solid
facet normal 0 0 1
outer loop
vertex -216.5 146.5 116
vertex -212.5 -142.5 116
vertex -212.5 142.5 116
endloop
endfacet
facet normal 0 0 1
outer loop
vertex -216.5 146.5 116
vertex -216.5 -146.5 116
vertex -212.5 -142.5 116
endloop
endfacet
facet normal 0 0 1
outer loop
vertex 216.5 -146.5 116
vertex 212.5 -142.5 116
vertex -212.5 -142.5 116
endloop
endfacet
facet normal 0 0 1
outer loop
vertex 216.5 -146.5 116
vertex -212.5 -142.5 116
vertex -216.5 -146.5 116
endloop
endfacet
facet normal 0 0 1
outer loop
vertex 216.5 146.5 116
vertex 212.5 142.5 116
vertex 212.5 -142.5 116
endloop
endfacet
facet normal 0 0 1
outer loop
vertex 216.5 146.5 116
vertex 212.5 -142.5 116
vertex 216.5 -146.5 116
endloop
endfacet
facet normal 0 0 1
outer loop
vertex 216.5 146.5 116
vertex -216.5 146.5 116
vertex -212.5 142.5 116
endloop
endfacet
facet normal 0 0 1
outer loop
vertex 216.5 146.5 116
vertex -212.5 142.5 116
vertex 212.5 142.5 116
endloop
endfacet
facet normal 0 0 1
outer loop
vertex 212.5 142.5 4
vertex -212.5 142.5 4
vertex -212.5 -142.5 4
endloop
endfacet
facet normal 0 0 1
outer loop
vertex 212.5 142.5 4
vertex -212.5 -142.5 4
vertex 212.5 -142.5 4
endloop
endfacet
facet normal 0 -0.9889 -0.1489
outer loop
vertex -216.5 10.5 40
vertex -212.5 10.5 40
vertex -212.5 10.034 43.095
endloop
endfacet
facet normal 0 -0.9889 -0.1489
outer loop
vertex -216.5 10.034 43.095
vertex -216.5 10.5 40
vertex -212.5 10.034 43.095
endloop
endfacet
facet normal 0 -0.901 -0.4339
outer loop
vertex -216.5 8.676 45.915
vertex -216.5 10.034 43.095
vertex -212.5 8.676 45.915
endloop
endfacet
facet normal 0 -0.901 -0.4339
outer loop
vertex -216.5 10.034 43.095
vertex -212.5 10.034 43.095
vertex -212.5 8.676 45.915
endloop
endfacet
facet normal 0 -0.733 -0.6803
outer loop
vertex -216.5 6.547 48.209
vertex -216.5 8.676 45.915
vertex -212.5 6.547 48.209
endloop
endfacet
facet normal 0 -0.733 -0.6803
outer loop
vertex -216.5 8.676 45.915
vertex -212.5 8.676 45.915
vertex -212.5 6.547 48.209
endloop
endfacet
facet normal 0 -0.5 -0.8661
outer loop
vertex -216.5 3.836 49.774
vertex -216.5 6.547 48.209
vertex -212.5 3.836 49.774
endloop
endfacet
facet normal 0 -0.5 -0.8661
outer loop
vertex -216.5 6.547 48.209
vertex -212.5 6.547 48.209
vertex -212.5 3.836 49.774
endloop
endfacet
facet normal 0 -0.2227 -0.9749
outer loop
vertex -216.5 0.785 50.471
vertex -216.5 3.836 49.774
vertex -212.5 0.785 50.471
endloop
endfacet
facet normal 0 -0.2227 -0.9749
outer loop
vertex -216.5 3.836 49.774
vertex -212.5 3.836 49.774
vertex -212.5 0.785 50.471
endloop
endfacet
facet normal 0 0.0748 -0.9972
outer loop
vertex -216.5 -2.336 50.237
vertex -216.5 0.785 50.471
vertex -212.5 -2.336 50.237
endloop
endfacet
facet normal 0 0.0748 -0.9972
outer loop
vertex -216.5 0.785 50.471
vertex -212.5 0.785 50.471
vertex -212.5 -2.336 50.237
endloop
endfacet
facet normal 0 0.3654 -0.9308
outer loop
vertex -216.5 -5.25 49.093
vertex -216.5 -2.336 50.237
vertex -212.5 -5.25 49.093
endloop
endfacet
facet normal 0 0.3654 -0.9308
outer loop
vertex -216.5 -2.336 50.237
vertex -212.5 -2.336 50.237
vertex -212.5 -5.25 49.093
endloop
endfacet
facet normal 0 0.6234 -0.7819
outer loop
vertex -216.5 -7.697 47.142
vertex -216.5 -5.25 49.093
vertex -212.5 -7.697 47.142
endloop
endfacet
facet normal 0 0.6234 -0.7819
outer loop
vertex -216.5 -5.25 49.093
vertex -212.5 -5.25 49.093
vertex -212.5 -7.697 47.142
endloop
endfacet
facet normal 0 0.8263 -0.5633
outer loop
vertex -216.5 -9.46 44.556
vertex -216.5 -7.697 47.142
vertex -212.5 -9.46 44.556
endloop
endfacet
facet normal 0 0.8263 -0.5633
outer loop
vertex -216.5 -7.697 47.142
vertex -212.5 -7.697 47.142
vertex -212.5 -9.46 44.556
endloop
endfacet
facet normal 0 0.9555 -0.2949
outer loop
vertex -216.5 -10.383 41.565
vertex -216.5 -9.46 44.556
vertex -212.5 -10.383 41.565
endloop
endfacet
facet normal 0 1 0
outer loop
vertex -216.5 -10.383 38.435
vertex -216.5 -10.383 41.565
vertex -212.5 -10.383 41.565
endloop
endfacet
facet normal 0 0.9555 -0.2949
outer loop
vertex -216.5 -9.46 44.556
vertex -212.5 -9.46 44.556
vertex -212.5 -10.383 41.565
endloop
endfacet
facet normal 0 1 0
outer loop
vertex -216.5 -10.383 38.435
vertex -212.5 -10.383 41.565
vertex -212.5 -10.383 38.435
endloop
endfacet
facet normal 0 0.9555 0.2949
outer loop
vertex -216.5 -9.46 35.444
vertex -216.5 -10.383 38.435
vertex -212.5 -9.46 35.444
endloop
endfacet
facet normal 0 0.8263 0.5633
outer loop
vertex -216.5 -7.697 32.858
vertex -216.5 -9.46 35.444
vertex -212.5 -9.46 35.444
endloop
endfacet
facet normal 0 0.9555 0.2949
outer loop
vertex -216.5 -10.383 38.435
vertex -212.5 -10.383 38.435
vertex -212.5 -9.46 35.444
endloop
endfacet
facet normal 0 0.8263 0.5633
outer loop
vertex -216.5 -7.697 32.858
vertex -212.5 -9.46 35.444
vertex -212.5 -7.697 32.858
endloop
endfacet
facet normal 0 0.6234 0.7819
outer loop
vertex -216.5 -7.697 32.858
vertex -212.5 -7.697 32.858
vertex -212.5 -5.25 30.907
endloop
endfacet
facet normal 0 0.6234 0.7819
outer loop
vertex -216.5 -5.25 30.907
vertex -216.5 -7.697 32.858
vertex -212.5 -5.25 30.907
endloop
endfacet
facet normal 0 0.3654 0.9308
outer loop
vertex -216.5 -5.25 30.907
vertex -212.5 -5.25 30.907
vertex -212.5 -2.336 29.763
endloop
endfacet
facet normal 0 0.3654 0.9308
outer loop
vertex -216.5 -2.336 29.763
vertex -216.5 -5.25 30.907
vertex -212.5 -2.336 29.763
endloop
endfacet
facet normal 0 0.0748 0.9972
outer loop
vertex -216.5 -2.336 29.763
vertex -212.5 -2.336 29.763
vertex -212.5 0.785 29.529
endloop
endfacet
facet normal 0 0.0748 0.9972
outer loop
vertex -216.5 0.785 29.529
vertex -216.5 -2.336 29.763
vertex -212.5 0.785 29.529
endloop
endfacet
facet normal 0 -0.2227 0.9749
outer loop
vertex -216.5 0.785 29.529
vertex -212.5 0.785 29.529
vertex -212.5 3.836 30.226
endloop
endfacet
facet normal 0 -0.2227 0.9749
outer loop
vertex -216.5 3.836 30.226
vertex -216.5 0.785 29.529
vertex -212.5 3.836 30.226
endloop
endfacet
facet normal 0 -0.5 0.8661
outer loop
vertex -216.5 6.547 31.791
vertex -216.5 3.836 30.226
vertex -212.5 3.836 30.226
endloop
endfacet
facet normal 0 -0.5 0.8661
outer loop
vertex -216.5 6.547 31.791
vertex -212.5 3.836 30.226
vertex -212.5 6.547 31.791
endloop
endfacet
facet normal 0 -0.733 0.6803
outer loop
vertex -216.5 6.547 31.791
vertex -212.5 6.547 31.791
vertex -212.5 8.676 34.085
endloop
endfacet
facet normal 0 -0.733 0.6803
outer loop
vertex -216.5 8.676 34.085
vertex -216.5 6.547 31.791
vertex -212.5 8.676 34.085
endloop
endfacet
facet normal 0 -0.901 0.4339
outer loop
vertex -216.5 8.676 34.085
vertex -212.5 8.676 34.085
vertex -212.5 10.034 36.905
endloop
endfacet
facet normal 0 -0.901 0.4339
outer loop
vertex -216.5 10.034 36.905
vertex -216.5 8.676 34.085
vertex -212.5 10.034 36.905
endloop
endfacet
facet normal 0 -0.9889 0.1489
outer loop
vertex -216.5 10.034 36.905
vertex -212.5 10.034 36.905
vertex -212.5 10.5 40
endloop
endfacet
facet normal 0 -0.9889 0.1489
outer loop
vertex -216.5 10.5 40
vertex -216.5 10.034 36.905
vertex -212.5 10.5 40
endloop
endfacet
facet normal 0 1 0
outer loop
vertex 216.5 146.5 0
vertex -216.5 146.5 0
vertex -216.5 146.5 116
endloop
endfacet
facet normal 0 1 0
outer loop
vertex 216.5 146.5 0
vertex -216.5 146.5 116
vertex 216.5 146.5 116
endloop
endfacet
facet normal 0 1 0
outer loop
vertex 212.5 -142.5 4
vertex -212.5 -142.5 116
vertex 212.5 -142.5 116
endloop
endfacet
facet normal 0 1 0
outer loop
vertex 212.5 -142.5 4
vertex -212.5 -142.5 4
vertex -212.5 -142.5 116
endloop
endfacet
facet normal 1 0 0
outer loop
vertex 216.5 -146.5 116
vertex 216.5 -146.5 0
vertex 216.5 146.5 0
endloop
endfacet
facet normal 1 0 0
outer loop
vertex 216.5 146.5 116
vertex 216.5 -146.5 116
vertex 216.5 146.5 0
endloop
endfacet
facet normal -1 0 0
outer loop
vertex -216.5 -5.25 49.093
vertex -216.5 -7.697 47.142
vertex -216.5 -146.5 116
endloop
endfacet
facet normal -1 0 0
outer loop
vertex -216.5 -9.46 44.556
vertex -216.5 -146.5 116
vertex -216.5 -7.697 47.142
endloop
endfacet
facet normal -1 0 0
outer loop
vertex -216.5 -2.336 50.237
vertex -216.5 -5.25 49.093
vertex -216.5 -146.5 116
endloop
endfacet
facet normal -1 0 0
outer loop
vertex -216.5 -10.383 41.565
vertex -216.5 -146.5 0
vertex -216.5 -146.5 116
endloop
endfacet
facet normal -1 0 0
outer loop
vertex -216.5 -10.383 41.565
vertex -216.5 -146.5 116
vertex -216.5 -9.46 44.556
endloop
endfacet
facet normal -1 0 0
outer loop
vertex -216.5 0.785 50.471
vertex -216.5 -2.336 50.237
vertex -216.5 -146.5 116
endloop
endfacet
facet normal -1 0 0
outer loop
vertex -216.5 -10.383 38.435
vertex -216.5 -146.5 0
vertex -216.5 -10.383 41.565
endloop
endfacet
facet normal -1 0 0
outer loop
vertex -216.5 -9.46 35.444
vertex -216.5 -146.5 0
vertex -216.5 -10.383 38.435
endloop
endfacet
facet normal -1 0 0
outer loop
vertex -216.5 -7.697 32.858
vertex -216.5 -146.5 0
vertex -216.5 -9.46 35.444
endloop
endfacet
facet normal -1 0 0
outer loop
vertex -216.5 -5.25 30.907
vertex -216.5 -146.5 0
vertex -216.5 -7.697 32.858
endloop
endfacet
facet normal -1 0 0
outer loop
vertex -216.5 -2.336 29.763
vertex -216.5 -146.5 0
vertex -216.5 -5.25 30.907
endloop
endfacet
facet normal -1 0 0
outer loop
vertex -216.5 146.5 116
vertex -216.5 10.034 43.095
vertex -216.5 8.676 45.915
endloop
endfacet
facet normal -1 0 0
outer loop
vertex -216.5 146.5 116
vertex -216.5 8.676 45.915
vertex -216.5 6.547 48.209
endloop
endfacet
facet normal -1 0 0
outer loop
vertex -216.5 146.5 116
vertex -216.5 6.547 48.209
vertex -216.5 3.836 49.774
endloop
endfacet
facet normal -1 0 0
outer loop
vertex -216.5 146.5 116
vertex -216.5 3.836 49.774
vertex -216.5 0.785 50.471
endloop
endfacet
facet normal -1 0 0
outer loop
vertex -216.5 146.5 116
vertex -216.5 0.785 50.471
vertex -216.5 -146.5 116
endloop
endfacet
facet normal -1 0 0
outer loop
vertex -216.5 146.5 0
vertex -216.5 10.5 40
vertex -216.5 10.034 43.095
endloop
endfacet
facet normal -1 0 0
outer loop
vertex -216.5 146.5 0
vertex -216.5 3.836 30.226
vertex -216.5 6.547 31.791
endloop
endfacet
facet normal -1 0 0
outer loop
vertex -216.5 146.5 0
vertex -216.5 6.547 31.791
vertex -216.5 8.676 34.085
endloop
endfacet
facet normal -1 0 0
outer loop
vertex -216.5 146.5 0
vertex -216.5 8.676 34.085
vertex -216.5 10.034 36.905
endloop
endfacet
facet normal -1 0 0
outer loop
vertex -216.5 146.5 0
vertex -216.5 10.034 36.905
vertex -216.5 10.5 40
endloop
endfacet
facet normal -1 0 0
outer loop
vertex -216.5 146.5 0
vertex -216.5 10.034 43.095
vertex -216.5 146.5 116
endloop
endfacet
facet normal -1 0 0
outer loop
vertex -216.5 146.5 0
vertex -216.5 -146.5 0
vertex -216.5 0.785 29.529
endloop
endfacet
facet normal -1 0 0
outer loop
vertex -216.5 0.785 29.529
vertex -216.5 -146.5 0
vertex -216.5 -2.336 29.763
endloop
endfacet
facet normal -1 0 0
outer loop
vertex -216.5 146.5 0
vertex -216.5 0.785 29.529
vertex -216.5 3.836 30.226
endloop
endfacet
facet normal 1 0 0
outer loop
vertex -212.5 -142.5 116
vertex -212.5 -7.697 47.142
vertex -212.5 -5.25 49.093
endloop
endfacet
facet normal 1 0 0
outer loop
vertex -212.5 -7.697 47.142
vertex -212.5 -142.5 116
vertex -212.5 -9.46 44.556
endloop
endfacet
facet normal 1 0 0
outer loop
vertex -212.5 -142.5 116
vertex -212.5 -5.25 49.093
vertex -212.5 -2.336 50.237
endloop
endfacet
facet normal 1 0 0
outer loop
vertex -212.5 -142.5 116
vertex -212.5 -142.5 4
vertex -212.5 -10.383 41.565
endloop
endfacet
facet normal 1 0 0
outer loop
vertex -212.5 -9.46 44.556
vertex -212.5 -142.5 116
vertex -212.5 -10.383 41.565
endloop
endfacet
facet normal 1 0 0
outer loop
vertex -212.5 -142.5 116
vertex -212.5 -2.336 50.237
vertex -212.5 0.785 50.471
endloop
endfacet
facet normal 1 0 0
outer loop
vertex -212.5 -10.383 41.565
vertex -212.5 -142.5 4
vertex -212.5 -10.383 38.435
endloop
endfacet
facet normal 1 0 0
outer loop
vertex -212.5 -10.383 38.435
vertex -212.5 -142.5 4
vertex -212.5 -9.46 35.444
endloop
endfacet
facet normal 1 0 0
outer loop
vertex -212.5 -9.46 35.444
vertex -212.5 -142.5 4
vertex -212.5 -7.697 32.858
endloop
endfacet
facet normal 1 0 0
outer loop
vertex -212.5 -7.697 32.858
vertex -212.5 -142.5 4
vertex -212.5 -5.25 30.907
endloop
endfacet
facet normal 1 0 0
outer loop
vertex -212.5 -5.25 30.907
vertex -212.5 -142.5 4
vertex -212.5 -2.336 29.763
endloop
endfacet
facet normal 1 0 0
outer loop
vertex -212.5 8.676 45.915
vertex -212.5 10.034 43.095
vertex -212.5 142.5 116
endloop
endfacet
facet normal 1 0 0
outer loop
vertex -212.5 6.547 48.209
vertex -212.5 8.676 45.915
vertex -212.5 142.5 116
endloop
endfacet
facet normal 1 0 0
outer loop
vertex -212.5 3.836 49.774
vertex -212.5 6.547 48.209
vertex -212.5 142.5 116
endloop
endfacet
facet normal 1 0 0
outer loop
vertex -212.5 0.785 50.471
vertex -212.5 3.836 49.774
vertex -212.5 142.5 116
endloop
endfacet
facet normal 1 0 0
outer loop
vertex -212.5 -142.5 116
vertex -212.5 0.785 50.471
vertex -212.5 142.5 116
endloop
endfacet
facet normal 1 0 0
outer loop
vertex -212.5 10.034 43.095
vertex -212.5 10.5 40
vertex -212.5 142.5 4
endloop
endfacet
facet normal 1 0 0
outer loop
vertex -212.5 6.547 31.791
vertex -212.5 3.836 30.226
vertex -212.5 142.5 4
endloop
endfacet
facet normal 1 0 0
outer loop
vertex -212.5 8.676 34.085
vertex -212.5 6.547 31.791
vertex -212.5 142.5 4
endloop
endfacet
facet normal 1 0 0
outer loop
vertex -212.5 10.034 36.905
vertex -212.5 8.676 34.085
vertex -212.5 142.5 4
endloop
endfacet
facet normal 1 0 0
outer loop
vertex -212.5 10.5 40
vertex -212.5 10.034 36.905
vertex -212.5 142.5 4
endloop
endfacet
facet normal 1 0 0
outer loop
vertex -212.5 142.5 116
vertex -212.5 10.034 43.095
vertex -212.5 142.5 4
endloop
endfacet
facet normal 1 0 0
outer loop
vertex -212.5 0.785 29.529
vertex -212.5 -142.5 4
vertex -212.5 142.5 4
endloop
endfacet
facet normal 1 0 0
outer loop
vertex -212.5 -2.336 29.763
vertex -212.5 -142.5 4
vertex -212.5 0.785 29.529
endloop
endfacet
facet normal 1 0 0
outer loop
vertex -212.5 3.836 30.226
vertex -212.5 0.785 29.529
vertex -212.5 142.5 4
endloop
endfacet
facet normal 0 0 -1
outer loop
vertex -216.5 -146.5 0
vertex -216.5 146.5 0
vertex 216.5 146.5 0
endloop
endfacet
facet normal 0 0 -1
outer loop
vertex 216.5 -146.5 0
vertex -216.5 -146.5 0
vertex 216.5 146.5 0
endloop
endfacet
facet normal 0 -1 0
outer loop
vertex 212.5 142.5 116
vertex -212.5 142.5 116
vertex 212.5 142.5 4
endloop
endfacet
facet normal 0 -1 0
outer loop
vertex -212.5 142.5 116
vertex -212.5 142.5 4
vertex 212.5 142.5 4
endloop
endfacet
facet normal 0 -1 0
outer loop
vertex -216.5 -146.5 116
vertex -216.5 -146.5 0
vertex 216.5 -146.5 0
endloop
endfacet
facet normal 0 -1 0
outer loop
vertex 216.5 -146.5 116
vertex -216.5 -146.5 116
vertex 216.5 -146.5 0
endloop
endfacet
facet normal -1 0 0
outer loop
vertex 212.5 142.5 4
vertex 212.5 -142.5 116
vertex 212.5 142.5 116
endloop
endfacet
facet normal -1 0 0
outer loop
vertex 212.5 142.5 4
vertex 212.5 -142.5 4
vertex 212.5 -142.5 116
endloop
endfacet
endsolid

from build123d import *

# Parameters (mm, degrees)
F0_W     = 433
F0_H     = 293
F1_DEPTH = 116
F2_T     = -4
F4_D     = 21
F4_DEPTH = 5


with BuildPart() as f1:
    # F0 (on Top) → F1 (new body)
    with BuildSketch(Plane.XY):
        Rectangle(F0_W, F0_H)
    extrude(amount=F1_DEPTH)

    # F2
    f2_openings = [f1.faces().sort_by_distance(p)[0] for p in [
        (0, 0, 116),
    ]]
    offset(amount=F2_T, openings=f2_openings)

    # F4
    with Locations(Plane(origin=(-216.5, 0, 0), x_dir=(0, -1, 0), z_dir=(-1, 0, 0))):
        with Locations((0, 40)):
            Hole(F4_D / 2, depth=F4_DEPTH)


solid = f1.part
